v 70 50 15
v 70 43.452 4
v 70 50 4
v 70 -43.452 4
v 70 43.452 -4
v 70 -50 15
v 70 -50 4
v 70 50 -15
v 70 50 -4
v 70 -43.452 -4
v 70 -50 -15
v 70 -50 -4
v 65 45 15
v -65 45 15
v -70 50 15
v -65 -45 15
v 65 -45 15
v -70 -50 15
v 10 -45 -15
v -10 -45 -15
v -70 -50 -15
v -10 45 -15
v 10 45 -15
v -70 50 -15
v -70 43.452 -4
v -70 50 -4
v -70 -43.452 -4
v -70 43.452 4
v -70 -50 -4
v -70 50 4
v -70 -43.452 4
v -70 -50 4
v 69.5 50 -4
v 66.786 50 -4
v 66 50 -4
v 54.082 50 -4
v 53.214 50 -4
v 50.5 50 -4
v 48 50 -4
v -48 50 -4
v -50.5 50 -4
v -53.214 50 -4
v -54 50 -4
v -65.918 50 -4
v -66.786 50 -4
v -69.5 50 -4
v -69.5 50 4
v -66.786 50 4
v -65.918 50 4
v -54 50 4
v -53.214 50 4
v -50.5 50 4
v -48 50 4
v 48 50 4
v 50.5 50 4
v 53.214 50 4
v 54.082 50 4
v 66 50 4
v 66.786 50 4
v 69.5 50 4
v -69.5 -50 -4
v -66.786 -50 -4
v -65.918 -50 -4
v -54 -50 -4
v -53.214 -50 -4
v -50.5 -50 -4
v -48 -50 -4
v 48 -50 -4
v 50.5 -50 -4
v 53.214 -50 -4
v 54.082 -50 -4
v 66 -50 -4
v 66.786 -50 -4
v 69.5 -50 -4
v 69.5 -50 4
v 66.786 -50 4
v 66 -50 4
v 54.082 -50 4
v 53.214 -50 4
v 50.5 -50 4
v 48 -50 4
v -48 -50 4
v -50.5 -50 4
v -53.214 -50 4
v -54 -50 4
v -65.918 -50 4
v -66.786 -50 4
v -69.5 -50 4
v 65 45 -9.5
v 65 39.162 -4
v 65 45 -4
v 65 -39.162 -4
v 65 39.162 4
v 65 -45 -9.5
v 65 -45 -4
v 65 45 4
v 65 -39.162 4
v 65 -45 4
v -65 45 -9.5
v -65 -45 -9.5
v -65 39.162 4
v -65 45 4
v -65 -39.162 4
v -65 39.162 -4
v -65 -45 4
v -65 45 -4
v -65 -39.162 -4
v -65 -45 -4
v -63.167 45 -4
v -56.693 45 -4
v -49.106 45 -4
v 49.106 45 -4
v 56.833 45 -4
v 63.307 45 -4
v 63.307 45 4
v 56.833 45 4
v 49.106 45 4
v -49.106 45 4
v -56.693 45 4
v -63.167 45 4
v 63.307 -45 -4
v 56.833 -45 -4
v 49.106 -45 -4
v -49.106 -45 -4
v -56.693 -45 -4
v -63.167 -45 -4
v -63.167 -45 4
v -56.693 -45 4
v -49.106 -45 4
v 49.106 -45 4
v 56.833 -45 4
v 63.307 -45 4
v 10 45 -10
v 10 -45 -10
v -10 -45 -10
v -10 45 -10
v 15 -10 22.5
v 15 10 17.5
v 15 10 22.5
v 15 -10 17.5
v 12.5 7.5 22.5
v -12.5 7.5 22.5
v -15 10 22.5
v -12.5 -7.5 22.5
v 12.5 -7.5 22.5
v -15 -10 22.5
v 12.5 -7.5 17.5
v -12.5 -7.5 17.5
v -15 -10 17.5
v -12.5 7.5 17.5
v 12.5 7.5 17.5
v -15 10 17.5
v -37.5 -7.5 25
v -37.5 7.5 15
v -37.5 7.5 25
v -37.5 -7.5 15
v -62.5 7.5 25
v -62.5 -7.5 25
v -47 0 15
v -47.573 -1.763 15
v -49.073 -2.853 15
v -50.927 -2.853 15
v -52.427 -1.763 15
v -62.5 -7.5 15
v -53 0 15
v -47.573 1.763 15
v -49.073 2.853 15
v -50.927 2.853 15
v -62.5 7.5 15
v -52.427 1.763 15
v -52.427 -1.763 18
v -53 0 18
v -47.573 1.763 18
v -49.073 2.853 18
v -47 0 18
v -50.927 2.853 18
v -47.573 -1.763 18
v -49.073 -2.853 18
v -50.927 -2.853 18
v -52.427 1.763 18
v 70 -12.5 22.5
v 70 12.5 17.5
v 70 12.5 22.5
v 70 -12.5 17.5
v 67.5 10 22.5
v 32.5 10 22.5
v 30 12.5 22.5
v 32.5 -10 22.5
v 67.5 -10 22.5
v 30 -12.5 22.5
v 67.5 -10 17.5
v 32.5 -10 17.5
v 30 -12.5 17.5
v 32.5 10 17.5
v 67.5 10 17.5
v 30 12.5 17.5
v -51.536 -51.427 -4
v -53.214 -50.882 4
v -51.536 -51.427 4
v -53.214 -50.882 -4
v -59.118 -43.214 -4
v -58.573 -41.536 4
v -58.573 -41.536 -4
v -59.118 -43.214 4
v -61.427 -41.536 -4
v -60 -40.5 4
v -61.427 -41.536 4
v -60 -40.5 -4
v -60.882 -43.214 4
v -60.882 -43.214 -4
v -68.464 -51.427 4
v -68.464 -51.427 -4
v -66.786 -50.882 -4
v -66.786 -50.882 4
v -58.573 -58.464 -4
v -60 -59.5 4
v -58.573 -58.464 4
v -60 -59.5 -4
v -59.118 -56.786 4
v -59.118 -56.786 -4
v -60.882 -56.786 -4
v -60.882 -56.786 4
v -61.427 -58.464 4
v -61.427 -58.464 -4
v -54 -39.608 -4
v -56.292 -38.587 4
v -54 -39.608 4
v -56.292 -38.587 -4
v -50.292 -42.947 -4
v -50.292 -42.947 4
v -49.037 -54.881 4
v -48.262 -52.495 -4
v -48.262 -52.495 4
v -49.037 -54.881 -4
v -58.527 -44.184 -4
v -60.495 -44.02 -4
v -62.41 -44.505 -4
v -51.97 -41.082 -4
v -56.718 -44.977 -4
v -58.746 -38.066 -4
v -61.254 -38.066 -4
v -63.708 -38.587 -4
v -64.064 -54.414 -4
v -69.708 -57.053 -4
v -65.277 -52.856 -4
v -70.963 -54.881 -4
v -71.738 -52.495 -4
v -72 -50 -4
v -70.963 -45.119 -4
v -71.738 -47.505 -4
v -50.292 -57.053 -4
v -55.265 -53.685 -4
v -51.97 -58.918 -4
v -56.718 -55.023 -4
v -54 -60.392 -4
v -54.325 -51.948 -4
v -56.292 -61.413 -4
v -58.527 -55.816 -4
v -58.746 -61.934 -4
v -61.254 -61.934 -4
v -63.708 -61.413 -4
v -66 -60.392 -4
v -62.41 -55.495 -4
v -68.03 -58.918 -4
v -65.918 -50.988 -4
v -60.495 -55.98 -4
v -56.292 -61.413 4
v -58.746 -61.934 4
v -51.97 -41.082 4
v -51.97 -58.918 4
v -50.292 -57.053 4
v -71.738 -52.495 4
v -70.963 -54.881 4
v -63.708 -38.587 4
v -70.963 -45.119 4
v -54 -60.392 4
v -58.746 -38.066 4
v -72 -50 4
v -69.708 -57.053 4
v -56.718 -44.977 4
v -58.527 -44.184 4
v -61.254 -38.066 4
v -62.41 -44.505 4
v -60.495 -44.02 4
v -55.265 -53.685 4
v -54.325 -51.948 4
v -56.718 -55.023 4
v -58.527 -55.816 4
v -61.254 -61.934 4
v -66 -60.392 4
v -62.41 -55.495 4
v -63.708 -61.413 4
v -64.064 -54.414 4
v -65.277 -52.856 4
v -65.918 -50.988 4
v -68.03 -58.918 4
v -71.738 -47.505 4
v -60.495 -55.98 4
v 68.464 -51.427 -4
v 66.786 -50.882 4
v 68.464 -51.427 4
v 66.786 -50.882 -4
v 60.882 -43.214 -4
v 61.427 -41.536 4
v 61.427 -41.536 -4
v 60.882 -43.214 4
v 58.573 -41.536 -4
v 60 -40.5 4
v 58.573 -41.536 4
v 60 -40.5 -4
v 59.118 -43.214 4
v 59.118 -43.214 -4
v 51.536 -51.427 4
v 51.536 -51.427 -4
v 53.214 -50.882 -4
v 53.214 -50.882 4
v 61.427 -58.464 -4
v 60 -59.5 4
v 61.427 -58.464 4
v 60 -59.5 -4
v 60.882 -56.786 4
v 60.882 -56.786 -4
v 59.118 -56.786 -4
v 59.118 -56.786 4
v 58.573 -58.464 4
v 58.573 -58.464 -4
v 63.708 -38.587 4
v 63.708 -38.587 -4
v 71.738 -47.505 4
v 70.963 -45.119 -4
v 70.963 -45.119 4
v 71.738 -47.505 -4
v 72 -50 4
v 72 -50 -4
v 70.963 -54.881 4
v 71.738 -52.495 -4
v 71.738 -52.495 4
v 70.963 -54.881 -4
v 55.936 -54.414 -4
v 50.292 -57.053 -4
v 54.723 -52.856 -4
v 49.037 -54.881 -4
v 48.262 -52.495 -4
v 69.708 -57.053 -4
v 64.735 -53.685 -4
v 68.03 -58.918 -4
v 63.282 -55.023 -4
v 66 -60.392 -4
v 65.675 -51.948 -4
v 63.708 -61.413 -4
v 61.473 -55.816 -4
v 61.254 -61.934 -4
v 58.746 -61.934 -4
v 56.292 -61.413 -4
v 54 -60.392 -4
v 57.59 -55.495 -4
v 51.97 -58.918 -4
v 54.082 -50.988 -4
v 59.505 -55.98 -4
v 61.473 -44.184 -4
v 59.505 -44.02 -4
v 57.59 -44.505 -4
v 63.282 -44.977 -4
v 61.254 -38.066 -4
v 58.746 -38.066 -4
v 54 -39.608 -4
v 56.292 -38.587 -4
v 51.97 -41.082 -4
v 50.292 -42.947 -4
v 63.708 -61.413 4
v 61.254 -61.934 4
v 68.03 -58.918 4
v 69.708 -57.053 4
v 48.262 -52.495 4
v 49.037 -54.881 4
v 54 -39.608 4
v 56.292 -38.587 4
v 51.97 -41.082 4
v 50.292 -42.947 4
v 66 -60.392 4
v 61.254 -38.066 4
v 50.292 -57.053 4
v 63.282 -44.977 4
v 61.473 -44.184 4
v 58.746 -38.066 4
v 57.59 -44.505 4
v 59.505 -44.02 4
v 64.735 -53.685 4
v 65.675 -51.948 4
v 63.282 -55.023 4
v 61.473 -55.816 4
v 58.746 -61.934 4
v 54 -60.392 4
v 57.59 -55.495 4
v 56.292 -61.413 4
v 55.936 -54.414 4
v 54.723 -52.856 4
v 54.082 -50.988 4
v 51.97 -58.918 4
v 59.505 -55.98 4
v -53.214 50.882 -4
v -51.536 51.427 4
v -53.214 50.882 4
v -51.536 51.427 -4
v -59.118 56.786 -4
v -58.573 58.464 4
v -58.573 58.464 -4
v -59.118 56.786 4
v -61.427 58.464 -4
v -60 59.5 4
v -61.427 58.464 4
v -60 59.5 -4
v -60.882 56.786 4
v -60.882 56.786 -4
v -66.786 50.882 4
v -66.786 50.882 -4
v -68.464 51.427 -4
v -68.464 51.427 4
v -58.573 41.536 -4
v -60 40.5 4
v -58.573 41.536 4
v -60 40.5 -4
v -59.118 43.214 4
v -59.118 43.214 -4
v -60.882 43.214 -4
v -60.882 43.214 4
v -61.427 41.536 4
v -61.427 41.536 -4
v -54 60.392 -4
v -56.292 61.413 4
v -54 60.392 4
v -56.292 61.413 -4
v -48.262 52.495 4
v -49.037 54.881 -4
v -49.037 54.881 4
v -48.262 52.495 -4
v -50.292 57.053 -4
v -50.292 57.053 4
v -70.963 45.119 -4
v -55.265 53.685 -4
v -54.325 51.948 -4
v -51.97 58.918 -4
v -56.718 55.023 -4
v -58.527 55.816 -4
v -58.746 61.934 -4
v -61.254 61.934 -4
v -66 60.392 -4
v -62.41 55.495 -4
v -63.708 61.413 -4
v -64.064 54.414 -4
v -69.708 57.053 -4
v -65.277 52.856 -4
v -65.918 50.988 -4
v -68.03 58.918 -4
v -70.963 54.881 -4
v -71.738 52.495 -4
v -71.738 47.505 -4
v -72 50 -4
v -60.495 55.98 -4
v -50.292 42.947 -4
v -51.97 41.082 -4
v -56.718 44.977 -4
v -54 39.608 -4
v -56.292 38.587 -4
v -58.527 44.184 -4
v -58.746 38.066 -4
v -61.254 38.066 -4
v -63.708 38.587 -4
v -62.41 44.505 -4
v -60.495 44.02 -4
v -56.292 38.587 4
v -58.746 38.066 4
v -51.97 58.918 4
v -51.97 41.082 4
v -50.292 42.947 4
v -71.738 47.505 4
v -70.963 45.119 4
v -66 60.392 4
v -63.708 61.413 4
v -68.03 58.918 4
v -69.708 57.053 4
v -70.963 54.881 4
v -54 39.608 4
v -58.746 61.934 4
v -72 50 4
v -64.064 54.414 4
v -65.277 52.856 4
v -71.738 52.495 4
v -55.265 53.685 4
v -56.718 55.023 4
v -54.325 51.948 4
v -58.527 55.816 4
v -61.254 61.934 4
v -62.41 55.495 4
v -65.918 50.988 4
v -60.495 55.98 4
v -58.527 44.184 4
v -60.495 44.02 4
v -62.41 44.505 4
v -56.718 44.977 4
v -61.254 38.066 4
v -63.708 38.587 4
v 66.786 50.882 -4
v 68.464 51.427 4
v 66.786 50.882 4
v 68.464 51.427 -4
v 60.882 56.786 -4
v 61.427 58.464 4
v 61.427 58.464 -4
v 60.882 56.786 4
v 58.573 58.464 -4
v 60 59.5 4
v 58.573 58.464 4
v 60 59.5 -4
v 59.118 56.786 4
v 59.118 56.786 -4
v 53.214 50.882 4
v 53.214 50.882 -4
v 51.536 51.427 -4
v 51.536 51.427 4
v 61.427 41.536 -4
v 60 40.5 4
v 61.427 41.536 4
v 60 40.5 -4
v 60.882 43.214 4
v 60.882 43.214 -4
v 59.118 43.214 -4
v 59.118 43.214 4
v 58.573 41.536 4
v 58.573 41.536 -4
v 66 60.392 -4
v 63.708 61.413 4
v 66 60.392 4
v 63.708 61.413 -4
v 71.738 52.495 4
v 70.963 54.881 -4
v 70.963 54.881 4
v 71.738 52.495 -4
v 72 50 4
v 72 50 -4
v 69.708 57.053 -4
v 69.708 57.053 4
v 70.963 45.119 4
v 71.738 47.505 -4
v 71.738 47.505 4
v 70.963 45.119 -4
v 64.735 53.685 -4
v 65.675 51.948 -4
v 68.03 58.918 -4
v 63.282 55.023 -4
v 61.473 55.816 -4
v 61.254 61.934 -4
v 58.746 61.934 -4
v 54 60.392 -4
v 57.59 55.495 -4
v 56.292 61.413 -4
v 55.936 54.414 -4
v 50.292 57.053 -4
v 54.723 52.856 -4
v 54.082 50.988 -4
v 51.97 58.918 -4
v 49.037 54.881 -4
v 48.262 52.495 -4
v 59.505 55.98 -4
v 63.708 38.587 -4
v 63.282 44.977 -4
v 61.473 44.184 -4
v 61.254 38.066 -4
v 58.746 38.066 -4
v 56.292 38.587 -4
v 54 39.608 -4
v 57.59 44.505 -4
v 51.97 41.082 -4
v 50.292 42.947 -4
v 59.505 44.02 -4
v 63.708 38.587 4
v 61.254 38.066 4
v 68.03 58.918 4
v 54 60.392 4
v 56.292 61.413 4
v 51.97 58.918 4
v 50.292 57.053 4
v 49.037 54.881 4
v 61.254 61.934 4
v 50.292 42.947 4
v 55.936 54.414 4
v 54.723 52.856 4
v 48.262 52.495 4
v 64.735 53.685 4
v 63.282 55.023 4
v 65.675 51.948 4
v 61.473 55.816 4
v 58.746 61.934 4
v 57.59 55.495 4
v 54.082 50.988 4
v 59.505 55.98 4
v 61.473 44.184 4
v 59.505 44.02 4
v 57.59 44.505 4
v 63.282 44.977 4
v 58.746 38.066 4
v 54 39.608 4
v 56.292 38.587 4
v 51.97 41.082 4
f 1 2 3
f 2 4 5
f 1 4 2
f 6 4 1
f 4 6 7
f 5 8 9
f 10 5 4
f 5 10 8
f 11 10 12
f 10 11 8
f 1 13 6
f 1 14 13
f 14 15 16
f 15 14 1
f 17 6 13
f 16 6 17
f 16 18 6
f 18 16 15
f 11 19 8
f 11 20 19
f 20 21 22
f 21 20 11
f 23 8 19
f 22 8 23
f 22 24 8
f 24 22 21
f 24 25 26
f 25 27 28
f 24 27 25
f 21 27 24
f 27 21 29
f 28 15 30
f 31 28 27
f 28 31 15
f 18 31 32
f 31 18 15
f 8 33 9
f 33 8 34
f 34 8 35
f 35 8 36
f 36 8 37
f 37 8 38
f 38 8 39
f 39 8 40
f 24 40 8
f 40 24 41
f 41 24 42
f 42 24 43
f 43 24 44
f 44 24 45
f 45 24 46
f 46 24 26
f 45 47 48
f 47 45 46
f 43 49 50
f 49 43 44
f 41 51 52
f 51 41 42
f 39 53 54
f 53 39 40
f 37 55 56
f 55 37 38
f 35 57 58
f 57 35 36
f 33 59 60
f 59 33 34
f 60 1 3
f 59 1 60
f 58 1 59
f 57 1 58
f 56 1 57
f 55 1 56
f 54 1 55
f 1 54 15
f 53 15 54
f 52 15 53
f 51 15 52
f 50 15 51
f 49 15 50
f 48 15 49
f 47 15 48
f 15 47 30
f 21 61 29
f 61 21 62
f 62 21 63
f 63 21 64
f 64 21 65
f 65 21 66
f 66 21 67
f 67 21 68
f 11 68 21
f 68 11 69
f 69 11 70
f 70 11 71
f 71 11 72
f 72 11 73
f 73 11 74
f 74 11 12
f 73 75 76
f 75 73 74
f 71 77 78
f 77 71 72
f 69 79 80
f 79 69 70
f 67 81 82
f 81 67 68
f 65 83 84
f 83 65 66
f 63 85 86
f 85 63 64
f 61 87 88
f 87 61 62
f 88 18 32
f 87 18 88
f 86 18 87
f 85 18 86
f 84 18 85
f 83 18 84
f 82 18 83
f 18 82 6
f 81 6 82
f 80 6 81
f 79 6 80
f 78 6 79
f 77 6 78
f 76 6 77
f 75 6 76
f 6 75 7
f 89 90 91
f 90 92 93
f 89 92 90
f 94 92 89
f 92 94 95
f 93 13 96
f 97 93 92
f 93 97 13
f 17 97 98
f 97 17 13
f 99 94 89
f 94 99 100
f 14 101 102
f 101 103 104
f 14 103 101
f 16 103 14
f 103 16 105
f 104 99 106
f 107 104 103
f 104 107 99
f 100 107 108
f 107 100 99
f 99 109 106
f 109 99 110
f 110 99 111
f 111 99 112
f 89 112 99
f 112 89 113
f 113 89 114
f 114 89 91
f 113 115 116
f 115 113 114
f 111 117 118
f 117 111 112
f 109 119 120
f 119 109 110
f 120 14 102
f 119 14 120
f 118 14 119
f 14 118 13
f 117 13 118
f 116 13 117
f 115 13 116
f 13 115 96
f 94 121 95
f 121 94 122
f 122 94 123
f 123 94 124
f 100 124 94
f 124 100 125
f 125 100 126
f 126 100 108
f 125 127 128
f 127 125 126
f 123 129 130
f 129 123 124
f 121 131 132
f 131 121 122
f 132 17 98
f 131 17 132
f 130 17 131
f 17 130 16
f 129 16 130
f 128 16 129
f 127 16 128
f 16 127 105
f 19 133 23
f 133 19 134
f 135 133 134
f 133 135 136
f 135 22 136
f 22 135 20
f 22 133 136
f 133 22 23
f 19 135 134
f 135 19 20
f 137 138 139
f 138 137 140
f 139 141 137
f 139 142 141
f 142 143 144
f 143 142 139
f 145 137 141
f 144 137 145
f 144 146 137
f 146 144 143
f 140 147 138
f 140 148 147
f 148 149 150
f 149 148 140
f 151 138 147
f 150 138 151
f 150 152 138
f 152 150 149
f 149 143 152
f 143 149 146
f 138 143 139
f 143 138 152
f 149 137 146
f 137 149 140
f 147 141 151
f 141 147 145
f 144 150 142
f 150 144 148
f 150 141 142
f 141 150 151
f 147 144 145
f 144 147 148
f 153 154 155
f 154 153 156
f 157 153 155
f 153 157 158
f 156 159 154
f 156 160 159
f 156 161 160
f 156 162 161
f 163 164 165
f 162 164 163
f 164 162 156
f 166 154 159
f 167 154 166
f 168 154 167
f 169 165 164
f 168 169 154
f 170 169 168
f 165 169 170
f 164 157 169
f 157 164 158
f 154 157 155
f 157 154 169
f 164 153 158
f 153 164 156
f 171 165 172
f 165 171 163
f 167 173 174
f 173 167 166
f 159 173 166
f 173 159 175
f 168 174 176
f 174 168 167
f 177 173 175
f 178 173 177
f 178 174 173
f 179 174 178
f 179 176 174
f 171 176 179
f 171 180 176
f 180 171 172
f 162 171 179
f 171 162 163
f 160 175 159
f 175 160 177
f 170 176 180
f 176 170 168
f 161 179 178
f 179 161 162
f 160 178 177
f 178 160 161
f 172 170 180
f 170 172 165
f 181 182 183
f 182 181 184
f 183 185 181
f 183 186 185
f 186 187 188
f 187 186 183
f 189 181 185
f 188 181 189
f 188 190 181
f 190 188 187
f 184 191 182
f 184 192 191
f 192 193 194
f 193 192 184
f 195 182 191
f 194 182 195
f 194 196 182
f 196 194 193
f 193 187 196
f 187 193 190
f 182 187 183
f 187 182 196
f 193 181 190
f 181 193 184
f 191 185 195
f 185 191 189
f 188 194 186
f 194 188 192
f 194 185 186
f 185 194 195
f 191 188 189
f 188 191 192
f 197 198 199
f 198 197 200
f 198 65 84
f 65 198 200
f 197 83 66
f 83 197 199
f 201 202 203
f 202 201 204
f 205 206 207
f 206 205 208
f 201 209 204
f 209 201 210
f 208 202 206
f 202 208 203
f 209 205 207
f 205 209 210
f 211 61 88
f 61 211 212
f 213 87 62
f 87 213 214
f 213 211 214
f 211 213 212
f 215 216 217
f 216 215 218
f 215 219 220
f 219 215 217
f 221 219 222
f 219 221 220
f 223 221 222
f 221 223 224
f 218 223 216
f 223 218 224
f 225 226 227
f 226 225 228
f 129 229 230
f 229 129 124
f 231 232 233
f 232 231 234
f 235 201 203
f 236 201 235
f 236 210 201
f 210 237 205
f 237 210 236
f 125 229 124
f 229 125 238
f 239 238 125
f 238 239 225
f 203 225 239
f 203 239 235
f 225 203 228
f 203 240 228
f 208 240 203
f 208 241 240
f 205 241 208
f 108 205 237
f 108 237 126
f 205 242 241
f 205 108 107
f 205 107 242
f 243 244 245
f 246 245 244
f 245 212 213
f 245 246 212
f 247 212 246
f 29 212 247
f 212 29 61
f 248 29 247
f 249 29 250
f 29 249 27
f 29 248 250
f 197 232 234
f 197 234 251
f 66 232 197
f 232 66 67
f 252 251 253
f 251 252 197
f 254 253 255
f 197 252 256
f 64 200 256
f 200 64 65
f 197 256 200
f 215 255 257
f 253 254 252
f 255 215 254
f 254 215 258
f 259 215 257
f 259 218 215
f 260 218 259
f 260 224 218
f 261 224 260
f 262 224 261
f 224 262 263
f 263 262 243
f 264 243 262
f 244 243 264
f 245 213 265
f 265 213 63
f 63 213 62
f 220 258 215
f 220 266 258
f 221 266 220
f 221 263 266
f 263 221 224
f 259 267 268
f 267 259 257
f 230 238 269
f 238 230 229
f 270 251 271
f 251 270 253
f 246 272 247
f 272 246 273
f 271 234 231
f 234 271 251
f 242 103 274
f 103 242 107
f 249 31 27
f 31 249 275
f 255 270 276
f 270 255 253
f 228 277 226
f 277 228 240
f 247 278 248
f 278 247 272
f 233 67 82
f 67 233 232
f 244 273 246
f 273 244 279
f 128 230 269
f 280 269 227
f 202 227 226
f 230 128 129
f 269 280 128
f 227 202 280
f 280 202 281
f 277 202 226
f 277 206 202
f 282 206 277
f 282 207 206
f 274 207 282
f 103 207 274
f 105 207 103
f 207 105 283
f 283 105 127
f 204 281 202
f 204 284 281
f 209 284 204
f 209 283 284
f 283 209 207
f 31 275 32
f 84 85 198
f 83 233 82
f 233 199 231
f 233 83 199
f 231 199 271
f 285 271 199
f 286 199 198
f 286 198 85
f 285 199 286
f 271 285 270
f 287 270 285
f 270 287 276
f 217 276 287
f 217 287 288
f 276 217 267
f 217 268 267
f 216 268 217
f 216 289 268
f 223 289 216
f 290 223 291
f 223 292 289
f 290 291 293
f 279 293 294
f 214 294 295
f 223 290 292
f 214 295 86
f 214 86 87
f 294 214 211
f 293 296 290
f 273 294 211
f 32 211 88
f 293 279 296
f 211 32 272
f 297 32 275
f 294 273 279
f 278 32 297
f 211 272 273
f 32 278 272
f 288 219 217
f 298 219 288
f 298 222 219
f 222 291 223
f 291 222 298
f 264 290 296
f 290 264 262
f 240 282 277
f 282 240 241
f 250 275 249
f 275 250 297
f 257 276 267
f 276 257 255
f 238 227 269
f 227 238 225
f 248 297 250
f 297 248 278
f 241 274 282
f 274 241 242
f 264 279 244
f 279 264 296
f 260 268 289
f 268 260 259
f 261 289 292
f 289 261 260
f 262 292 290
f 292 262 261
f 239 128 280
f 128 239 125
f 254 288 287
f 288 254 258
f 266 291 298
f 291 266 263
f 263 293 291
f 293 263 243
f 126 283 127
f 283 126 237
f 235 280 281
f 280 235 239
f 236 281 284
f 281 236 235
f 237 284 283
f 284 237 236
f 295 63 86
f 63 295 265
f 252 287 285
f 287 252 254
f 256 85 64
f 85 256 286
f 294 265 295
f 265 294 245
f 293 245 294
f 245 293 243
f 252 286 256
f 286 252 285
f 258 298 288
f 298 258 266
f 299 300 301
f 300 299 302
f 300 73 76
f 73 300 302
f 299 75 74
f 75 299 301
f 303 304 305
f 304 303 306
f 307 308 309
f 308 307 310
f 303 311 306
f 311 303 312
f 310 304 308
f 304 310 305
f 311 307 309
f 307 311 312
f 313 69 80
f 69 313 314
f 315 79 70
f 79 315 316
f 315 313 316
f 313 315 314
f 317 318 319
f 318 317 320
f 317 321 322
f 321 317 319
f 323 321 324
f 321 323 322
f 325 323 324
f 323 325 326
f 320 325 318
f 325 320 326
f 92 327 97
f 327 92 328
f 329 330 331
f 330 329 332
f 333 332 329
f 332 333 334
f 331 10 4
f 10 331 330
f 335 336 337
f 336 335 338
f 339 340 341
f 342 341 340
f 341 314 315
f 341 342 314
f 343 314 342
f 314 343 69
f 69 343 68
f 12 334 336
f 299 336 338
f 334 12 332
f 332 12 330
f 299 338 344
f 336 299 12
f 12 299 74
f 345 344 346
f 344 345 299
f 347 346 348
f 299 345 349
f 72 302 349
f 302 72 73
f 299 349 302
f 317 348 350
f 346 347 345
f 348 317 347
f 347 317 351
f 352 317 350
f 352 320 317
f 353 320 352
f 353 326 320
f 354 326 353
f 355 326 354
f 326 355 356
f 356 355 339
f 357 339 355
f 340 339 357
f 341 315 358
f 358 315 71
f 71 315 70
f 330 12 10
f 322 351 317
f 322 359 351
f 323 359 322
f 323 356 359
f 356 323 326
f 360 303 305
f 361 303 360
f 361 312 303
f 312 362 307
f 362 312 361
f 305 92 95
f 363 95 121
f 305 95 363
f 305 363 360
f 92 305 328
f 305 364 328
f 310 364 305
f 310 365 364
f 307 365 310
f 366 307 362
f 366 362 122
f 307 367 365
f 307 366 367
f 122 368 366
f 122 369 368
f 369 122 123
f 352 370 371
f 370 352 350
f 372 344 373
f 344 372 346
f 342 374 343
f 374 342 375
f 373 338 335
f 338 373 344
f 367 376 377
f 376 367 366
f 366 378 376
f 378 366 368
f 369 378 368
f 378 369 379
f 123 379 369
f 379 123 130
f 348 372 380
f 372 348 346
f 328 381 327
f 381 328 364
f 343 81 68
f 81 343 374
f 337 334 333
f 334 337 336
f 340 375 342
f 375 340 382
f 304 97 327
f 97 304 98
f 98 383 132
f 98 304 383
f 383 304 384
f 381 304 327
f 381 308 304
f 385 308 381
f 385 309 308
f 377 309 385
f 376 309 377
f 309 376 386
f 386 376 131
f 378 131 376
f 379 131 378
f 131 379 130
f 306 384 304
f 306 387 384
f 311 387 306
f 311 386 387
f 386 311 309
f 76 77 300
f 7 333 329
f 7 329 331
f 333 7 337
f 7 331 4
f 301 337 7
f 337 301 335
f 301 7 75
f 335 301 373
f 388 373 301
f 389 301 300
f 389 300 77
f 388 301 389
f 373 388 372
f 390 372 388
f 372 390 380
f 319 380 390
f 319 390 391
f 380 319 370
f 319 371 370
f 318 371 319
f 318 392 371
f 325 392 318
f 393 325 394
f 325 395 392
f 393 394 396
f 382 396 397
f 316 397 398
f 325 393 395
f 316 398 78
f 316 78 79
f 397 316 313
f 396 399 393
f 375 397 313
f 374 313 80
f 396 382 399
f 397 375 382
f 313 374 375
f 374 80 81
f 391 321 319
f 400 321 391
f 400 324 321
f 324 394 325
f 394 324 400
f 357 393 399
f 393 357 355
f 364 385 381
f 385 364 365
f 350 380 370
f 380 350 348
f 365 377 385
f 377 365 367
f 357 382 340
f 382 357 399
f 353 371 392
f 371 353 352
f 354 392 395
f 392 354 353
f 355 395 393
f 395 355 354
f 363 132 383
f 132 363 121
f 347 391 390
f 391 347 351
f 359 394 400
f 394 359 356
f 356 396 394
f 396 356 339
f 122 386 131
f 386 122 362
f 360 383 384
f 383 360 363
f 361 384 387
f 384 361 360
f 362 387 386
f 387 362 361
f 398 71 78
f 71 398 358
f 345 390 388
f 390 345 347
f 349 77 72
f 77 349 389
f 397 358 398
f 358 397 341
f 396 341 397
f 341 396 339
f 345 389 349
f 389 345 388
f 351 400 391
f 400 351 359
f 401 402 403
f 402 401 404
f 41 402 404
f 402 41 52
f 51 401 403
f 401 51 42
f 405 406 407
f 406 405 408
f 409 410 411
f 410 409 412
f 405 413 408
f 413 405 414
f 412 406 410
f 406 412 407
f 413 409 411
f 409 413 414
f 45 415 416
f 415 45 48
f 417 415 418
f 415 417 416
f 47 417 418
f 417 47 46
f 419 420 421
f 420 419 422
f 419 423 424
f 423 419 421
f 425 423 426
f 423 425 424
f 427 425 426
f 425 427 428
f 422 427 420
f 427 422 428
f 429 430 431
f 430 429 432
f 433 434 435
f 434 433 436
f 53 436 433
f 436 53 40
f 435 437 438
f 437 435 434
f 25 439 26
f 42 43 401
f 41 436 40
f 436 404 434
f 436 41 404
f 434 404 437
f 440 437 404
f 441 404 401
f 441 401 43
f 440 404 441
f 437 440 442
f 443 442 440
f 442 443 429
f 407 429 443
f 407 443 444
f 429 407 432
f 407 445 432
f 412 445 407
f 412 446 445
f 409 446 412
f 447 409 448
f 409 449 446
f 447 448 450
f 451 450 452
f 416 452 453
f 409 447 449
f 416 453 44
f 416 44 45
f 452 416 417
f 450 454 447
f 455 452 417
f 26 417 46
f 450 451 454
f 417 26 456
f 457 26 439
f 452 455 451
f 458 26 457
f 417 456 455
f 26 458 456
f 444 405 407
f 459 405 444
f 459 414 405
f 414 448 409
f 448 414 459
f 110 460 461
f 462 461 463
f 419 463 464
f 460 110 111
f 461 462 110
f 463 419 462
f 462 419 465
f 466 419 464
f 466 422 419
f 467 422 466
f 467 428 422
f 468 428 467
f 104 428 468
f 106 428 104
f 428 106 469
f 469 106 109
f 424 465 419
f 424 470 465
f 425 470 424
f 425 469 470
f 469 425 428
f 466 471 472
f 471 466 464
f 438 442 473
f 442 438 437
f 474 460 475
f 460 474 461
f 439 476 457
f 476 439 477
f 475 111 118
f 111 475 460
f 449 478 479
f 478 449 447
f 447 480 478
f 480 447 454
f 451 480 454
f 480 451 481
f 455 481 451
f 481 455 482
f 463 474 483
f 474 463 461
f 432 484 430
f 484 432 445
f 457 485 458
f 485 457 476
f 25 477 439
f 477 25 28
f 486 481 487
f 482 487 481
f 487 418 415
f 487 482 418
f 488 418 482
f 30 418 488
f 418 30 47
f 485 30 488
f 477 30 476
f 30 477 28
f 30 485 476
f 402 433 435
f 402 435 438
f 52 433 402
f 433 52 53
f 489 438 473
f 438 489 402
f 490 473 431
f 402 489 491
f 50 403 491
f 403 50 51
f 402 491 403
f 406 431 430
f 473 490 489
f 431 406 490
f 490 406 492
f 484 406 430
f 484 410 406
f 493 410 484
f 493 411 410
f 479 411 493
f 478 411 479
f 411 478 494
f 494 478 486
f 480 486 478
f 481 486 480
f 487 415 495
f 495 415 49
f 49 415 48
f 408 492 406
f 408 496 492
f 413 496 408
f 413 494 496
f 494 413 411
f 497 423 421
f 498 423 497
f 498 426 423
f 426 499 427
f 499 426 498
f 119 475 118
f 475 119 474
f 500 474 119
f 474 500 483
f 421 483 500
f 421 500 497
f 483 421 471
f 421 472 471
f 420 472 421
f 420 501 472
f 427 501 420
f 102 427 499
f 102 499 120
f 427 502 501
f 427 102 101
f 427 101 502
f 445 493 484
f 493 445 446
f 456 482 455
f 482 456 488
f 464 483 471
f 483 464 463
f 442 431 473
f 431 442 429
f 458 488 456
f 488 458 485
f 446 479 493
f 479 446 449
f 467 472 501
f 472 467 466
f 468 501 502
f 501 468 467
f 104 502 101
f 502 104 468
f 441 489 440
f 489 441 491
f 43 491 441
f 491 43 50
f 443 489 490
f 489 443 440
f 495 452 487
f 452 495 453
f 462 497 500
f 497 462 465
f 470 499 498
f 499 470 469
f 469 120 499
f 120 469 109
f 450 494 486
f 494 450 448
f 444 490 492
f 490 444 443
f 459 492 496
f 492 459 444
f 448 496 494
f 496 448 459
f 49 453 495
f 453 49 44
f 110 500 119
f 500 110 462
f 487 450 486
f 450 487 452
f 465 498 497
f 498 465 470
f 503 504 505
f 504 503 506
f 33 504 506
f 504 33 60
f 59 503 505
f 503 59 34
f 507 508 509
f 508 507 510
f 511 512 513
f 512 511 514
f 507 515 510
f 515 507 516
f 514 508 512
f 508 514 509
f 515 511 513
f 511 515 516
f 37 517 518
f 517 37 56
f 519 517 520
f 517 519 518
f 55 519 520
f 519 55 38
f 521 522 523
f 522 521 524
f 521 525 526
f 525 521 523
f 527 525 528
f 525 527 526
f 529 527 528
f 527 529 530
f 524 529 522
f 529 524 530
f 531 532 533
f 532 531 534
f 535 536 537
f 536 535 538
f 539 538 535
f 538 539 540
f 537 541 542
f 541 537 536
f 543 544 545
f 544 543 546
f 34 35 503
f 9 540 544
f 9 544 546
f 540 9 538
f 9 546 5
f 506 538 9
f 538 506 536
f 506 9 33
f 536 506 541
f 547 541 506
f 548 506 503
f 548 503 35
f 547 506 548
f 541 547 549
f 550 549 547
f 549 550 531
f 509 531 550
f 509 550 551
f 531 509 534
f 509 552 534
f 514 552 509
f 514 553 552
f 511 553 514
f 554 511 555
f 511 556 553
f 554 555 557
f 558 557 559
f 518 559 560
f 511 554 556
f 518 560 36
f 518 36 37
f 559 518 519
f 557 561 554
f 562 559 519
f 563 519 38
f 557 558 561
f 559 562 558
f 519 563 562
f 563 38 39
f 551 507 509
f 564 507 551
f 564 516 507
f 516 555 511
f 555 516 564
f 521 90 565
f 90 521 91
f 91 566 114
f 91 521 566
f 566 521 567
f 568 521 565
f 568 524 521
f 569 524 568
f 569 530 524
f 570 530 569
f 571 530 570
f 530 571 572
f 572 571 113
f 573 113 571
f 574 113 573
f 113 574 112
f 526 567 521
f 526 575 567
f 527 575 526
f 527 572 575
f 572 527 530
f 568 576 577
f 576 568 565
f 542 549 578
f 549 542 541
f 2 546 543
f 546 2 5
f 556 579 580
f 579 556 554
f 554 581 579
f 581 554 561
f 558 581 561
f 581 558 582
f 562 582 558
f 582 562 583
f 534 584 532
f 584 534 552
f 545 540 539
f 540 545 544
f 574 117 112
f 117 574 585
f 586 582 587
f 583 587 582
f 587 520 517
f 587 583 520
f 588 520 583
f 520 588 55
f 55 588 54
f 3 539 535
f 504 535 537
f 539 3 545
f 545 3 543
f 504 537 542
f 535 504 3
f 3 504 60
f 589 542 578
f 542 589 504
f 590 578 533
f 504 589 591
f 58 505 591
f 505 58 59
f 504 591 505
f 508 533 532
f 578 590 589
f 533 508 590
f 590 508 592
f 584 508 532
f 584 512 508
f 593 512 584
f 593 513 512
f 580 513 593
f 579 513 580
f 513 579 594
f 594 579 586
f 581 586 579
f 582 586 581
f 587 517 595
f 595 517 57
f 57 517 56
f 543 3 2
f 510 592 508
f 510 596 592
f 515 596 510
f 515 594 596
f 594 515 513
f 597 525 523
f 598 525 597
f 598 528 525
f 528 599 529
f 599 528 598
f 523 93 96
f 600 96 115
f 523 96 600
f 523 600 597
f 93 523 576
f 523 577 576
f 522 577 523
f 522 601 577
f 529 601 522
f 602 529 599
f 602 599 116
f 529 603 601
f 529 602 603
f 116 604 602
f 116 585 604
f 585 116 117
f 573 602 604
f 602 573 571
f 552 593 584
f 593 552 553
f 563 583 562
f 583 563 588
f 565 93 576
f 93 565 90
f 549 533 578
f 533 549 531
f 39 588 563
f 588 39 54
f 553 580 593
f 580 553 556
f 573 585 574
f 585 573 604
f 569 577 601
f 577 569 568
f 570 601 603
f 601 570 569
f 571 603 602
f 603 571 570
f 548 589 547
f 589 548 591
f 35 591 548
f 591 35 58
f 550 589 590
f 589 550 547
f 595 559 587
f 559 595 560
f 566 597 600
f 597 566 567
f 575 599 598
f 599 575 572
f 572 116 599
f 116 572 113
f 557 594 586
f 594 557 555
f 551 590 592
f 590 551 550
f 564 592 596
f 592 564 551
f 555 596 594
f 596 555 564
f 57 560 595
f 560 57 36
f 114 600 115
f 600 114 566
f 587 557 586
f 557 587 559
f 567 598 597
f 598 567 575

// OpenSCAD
module sensor_body() {
    difference() {
        cube([140, 100, 30], center=true);
        translate([0, 0, 3])
            cube([130, 90, 25], center=true);
        translate([0, 0, -15])
            cube([20, 90, 10], center=true);
    }
}

module camera_window() {
    difference() {
        cube([30, 20, 5], center=true);
        cube([25, 15, 6], center=true);
    }
}

module laser_sensor() {
    difference() {
        cube([25, 15, 10], center=true);
        translate([0, 0, -5])
            cylinder(h=6, r=3, center=true);
    }
}

module display_mount() {
    difference() {
        cube([40, 25, 5], center=true);
        cube([35, 20, 6], center=true);
    }
}

module connector_flange() {
    difference() {
        cylinder(h=8, r=12, center=true);
        cylinder(h=10, r=6, center=true);
        for (i = [0:3]) {
            rotate([0, 0, i * 90])
                translate([8, 0, 0])
                    cylinder(h=10, r=1.5, center=true);
        }
    }
}

module tochnoves_full() {
    sensor_body();
    translate([0, 0, 20])
        camera_window();
    translate([-50, 0, 20])
        laser_sensor();
    translate([50, 0, 20])
        display_mount();
    translate([-60, -50, 0])
        connector_flange();
    translate([60, -50, 0])
        connector_flange();
    translate([-60, 50, 0])
        connector_flange();
    translate([60, 50, 0])
        connector_flange();
}

tochnoves_full();
